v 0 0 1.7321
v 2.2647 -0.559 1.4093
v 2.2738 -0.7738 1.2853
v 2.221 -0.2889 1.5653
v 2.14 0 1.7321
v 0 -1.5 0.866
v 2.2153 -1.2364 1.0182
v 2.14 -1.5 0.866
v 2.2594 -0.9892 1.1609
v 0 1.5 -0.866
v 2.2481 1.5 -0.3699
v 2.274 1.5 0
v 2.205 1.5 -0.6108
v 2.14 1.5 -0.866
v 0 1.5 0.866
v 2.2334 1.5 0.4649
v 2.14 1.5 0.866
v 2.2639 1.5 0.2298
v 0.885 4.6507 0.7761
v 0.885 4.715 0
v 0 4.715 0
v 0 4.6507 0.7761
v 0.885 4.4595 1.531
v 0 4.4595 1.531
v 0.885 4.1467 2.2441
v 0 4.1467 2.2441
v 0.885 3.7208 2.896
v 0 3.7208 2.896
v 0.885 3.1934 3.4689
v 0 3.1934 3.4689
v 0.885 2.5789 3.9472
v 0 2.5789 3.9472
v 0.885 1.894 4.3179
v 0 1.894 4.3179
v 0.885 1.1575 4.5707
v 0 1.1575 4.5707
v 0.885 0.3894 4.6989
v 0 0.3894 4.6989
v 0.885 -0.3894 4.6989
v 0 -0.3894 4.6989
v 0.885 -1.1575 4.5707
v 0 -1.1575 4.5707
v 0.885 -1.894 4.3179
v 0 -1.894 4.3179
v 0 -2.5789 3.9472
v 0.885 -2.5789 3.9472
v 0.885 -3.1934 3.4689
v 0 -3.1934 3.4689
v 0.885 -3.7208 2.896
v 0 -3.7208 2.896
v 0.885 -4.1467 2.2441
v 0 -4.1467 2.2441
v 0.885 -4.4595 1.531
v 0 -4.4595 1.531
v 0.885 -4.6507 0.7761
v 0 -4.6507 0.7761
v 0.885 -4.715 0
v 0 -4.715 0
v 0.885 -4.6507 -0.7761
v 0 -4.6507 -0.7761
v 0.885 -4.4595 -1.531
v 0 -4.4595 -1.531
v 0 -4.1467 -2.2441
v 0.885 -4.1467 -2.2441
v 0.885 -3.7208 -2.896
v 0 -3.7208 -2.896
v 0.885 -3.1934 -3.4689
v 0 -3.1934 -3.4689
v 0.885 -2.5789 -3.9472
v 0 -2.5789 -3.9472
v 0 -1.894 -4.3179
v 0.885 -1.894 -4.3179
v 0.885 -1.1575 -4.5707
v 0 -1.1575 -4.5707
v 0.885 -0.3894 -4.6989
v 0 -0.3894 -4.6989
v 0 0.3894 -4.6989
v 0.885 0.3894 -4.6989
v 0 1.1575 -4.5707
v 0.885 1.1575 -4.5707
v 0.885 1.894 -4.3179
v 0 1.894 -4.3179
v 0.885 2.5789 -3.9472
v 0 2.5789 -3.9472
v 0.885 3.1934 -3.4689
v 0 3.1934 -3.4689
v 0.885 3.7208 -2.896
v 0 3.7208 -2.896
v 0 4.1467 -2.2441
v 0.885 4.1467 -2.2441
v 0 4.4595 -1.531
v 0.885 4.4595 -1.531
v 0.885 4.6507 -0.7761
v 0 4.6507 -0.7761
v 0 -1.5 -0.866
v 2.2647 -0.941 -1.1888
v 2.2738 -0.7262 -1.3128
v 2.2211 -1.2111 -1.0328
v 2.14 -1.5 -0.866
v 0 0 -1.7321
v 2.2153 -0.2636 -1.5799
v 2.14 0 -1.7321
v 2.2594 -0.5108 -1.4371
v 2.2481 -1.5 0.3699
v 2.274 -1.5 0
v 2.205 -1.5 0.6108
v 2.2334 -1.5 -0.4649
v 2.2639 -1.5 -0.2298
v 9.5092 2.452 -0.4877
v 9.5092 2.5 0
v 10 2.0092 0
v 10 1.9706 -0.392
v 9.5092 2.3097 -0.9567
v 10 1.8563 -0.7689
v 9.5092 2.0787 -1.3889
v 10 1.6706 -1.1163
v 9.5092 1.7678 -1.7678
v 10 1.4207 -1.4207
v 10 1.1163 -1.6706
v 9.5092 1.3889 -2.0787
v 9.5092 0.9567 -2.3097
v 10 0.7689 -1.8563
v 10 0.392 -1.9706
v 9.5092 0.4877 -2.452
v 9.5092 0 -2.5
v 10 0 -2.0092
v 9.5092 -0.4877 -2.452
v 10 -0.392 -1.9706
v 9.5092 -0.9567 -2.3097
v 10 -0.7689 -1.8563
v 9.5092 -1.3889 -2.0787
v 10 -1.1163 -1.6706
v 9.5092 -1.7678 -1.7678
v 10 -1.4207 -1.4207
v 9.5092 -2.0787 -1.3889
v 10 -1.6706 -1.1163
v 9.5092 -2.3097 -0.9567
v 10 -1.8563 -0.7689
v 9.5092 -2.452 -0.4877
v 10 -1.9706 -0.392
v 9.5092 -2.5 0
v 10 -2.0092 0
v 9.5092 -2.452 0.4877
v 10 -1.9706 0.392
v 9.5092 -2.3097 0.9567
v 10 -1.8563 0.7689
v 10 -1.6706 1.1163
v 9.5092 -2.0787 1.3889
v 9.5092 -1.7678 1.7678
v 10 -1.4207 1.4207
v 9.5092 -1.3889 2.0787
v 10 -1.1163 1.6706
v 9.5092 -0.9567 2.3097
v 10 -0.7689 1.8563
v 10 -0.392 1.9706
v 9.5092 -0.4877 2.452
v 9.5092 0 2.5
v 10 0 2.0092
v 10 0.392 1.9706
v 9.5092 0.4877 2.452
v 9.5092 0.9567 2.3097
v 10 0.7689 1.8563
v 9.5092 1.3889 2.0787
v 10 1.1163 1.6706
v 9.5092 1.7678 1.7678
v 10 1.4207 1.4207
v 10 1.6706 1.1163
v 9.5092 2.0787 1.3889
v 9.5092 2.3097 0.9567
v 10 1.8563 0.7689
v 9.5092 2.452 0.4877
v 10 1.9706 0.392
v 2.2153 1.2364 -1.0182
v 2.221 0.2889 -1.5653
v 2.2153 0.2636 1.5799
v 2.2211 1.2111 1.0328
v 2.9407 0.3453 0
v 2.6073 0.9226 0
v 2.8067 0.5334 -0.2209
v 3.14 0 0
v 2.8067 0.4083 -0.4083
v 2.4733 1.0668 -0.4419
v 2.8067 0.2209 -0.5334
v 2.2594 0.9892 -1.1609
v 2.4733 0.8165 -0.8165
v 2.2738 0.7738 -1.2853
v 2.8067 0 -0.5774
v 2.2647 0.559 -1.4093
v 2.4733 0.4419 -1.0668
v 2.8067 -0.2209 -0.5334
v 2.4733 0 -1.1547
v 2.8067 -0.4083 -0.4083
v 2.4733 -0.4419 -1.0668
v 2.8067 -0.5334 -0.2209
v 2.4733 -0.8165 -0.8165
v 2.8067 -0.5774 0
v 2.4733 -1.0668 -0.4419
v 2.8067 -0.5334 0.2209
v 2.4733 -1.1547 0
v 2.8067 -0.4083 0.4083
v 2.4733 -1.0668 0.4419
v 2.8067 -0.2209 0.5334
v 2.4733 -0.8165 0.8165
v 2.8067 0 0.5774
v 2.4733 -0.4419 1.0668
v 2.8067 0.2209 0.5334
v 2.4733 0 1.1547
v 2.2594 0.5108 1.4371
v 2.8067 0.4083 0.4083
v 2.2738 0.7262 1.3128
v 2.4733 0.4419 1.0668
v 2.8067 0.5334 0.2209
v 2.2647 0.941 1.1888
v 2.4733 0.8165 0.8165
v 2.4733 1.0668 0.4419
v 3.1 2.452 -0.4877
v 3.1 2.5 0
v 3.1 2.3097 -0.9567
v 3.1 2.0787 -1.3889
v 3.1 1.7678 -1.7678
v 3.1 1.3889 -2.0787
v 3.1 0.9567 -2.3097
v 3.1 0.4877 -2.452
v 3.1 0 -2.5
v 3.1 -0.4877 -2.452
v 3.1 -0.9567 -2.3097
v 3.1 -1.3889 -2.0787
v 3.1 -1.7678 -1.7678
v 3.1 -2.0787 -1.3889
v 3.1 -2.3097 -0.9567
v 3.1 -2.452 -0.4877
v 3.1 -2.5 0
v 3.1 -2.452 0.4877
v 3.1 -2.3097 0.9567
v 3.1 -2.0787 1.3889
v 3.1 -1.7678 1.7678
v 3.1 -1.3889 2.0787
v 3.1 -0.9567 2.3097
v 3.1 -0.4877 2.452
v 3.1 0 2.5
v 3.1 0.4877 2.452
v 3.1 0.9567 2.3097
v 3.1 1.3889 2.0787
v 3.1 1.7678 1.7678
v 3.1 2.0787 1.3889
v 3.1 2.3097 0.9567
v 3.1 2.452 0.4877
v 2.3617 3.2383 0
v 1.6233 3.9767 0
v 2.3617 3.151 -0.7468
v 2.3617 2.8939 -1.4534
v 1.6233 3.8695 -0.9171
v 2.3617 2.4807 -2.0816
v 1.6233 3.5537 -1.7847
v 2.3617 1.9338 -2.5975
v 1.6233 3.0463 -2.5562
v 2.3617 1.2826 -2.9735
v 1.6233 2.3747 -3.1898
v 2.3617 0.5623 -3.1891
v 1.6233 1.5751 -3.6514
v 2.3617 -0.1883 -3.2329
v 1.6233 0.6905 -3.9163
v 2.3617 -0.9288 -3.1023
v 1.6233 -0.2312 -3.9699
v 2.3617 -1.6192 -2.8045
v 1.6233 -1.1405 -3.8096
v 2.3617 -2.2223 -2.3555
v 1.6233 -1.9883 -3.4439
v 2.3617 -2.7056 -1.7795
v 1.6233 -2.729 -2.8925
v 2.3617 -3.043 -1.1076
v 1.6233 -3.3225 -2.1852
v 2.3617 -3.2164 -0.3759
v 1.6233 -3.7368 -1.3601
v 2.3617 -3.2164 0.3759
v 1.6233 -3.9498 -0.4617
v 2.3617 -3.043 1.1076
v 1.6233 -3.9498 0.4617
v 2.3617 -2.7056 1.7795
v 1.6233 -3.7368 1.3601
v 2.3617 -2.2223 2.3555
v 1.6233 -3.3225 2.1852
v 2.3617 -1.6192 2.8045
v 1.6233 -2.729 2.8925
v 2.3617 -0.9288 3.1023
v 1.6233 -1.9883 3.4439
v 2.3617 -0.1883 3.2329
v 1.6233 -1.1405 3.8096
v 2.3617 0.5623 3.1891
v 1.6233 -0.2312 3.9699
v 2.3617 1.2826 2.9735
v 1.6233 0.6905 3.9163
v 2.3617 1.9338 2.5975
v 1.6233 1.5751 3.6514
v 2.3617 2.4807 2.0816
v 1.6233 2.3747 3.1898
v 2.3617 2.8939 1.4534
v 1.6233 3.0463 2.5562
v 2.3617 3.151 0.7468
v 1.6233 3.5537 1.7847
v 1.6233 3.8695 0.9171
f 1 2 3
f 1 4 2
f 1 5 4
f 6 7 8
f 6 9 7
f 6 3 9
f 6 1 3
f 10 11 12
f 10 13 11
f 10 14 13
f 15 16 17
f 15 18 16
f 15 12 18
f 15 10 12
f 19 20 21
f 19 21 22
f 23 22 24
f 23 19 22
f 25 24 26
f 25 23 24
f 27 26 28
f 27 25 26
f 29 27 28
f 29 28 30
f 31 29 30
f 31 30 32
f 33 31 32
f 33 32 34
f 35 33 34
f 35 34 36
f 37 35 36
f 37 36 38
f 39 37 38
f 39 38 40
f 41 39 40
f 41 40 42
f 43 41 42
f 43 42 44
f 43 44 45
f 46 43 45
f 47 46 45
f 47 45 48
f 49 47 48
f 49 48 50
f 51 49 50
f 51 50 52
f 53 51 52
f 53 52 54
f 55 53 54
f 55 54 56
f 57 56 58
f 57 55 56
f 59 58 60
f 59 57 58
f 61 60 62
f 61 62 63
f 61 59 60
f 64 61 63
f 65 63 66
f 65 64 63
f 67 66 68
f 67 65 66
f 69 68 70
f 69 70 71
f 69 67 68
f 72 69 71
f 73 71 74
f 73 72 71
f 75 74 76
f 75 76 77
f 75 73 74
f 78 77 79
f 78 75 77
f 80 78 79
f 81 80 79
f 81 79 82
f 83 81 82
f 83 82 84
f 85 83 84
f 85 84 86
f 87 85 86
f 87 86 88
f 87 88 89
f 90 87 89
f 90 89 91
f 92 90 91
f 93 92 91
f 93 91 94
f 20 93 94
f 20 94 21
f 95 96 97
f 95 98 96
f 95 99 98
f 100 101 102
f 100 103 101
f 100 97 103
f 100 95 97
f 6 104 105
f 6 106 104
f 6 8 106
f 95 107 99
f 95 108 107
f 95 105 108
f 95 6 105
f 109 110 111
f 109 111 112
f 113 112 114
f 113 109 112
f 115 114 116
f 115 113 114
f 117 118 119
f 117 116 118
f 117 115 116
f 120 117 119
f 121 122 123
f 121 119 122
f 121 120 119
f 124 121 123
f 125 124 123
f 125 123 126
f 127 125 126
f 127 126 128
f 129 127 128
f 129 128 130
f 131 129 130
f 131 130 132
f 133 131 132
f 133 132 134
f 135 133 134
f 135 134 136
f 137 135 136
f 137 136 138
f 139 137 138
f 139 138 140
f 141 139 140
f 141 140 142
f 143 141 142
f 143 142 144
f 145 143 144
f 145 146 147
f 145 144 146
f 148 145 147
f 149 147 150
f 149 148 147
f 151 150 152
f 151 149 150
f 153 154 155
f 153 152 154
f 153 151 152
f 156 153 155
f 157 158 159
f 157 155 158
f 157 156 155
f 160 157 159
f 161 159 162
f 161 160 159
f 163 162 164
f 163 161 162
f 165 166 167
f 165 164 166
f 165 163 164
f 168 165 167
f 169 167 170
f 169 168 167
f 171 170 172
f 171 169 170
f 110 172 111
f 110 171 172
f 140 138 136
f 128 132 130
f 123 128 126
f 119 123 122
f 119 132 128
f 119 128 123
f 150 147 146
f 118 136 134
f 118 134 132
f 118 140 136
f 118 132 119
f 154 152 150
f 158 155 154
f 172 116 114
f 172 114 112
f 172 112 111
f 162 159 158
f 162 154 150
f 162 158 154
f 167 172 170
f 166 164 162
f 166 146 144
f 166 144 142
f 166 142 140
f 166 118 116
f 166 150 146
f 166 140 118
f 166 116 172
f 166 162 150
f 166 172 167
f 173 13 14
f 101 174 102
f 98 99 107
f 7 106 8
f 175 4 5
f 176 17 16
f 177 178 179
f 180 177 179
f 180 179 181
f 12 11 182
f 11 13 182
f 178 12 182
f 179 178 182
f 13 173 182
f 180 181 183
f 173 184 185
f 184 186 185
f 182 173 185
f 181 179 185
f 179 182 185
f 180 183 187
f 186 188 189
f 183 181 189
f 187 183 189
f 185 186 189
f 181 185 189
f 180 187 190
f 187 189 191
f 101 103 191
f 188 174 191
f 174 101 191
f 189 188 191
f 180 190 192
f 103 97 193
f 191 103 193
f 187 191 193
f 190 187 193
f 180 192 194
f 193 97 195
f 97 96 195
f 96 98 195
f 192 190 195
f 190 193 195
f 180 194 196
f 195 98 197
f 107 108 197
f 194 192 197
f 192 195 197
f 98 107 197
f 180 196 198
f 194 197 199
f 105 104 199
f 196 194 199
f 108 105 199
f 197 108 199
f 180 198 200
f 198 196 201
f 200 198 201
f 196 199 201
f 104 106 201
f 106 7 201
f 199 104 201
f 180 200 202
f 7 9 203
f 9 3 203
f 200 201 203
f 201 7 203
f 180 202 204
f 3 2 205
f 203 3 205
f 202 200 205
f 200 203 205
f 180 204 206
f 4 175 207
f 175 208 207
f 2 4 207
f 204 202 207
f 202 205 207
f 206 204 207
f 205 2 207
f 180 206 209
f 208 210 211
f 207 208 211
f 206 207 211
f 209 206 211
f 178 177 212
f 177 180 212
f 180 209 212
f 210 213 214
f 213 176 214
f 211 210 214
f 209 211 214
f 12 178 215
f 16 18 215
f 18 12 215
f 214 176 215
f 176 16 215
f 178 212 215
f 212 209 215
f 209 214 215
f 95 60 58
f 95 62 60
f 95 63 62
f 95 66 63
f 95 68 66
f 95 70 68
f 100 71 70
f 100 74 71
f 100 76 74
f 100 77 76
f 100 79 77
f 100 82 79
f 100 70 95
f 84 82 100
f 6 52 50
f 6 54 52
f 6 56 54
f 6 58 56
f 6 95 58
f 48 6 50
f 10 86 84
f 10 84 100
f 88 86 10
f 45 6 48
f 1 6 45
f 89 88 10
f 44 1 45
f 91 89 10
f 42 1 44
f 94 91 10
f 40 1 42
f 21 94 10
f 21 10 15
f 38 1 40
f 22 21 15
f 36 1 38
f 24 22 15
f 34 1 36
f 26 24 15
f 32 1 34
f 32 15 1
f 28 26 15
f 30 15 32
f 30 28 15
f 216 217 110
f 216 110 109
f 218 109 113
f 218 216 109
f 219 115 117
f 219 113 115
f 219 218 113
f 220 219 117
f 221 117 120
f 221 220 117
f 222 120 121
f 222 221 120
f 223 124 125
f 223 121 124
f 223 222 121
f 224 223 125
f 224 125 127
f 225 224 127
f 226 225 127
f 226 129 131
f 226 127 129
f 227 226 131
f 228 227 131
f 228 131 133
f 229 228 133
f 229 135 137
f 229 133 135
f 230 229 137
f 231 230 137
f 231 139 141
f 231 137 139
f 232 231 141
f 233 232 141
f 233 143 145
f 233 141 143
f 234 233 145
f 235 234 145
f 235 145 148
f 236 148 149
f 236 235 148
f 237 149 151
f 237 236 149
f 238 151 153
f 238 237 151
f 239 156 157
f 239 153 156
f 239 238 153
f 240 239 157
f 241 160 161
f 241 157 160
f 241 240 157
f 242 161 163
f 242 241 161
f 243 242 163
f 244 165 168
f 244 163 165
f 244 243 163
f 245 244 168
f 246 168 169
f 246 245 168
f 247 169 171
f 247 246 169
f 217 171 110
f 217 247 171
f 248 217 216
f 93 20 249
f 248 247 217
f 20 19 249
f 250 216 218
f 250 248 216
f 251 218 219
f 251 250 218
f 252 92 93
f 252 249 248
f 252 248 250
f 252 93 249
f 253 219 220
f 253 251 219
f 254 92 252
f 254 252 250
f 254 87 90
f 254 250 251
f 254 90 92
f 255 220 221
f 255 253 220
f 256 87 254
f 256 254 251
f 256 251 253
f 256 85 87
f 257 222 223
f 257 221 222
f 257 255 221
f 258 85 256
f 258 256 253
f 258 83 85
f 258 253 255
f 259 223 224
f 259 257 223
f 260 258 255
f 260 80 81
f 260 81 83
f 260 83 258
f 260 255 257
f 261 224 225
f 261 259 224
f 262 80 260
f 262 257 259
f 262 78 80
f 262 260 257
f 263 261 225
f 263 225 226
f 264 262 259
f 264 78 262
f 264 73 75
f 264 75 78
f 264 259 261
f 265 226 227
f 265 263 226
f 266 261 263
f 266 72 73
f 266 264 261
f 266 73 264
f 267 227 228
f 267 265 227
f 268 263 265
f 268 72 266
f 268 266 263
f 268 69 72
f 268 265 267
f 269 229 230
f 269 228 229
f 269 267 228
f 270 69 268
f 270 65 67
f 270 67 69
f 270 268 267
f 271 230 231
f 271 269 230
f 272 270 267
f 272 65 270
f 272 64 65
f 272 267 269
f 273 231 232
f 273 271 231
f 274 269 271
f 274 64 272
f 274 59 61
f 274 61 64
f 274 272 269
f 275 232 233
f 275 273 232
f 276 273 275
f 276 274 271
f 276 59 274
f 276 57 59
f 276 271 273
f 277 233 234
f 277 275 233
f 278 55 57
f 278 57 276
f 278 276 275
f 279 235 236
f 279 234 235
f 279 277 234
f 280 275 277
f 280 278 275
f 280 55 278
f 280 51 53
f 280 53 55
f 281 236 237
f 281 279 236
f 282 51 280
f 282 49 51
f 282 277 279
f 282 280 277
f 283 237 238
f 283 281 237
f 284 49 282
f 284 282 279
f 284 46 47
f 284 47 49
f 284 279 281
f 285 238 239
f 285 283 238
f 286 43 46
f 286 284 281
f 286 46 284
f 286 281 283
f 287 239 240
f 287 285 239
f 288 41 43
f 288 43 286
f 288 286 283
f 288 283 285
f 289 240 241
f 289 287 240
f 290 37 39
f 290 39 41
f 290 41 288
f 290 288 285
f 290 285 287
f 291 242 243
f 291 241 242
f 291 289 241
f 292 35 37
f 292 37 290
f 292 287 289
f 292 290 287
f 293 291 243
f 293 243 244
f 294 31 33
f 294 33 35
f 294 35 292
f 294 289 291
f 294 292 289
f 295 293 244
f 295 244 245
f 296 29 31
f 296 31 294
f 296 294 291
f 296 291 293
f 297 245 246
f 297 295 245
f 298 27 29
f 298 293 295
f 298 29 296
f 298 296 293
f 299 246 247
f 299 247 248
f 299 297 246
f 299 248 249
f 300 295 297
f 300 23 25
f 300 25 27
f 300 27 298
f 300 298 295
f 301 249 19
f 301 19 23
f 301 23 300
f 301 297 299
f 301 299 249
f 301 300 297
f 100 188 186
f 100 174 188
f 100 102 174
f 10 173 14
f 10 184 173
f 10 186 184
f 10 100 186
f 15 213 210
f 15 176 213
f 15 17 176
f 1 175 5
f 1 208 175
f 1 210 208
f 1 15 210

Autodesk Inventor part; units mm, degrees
ref_plane "YZ Plane" through (0, 0, 0) normal (1, 0, 0) x (0, 1, 0)
ref_plane "XZ Plane" through (0, 0, 0) normal (0, 1, 0) x (-1, 0, 0)
sketch "Esquisse1" plane through (0, 0, 0) normal (0, 0, 1) x (1, 0, 0)
  line L0 (10, 0) -> (10, 2.5)
  line L1 (10, 2.5) -> (5.6, 2.5)
  line L2 (5.6, 2.5) -> (5.1092, 2.5)
  line L3 (0, 4.715) -> (0, 1.7321)
  line L4 (0, 1.7321) -> (2.14, 1.7321)
  line L5 (2.14, 1.7321) -> (3.14, 0)
  line L6 (3.14, 0) -> (10, 0)
  line L7 (0, 4.715) -> (0.885, 4.715)
  line L8 (0.885, 4.715) -> (3.1, 2.5)
  line L9 (5.1092, 2.5) -> (3.1, 2.5)
  line L10 (5.6, 2.5) -> (3.1, 2.5) construction
  line L11 (3.1, 2.5) -> (3.1, 2.5)
  line L12 (-2, 0) -> (12, 0) projected
  line L13 (0, -0.943) -> (0, 5.658) projected
  dimension "d0" = 10
  dimension "d1" = 4.4
  dimension "d2" = 2.14
  dimension "d3" = 5
  dimension "d6" = 3.1
  dimension "d7" = 45
  dimension "d8" = 3.4641
  dimension "d9" = 60
  dimension "d10" = 9.43
  dimension "d11" = 5
  dimension "d12" = 0.4908
revolve "Corps" add sketch "Esquisse1" angle 360 about axis through (3.14, 0, 0) along (1, 0, 0) contours L6 L5 L4 L3 L7 L8 L9 L2 L1 L0
sketch "Esquisse2" plane through (0, 0, 0) normal (-1, 0, 0) x (0, 0, 1)
  circle A0 centre (0, 0) radius 1.7321 projected
  line L0 (0, -6.601) -> (0, 6.601) projected
  line L1 (-6.601, 0) -> (6.601, 0) projected
  line L2 (1.7321, 0) -> (0.866, -1.5)
  line L3 (0.866, -1.5) -> (-0.866, -1.5)
  line L4 (-0.866, -1.5) -> (-1.7321, 0)
  line L5 (-1.7321, 0) -> (-0.866, 1.5)
  line L6 (-0.866, 1.5) -> (0.866, 1.5)
  line L7 (0.866, 1.5) -> (1.7321, 0)
  point P0 (0, 1.7321)
extrude "Rainure" add sketch "Esquisse2" against normal up to next contours L7 A0 | A0 L2 | L6 L0 A0 | A0 L0 L3 | L0 L6 A0 | A0 L3 L0 | L4 A0 | A0 L5
thread "Filetage" size "M5x0.8" class "6g" standard "ISO Metric profile" length 4.4
chamfer "Chanfrein1" distance 0.4908 distance2 0.4908 1 edges at (10, -2.5, 0) measured on face at (10, 0.4809, 1.5312)
ref_plane "Work Plane1" through (104.775, 0, 0) normal (0, 0, -1) x (1, 0, 0)
equation "\"d15\" = GEL"
equation "\"d17\" = -0.5 * SPD + 0.5 * GD"
equation "\"d18\" = GUL"
equation "\"d0\" = NLG"
equation "\"d1\" = GEL"
equation "\"d2\" = INTI"
equation "\"d3\" = GD"
equation "\"d6\" = KOH"
equation "\"d7\" = 0.5 * SEWI"
equation "\"d8\" = 1.1547 * SW"
equation "\"d10\" = KOD"
equation "\"d11\" = BDM"
equation "\"d12\" = GAL"
equation "\"NLG\" = 10"
equation "\"INTI\" = 2.14"
equation "\"GEL\" = 4.4"
equation "\"GAL\" = 0.61345 * PTC"
equation "\"KOH\" = 3.1"
equation "\"KOD\" = 9.43"
equation "\"GUL\" = 0.61345 * PTC"
equation "\"SPD\" = NND - 1.2269 * PTC"
equation "\"BDM\" = NND"
equation "\"GD\" = NND"
equation "\"SEWI\" = 90deg"
equation "\"SW\" = 3"
equation "\"TOA\" = 30deg"
equation "\"GD1\" = THREADDIA - 1.2269 * PTC"
equation "\"EPV\" = 5.6"
equation "\"THREADDIA\" = 5"
equation "\"PTC\" = 0.8"
equation "\"NND\" = 5"
equation "\"E0\" = 3.47"
equation "\"THREADDESC\" = 1.2345"
properties part number "ISO 10642 - M5 x  10" material "Acier"
